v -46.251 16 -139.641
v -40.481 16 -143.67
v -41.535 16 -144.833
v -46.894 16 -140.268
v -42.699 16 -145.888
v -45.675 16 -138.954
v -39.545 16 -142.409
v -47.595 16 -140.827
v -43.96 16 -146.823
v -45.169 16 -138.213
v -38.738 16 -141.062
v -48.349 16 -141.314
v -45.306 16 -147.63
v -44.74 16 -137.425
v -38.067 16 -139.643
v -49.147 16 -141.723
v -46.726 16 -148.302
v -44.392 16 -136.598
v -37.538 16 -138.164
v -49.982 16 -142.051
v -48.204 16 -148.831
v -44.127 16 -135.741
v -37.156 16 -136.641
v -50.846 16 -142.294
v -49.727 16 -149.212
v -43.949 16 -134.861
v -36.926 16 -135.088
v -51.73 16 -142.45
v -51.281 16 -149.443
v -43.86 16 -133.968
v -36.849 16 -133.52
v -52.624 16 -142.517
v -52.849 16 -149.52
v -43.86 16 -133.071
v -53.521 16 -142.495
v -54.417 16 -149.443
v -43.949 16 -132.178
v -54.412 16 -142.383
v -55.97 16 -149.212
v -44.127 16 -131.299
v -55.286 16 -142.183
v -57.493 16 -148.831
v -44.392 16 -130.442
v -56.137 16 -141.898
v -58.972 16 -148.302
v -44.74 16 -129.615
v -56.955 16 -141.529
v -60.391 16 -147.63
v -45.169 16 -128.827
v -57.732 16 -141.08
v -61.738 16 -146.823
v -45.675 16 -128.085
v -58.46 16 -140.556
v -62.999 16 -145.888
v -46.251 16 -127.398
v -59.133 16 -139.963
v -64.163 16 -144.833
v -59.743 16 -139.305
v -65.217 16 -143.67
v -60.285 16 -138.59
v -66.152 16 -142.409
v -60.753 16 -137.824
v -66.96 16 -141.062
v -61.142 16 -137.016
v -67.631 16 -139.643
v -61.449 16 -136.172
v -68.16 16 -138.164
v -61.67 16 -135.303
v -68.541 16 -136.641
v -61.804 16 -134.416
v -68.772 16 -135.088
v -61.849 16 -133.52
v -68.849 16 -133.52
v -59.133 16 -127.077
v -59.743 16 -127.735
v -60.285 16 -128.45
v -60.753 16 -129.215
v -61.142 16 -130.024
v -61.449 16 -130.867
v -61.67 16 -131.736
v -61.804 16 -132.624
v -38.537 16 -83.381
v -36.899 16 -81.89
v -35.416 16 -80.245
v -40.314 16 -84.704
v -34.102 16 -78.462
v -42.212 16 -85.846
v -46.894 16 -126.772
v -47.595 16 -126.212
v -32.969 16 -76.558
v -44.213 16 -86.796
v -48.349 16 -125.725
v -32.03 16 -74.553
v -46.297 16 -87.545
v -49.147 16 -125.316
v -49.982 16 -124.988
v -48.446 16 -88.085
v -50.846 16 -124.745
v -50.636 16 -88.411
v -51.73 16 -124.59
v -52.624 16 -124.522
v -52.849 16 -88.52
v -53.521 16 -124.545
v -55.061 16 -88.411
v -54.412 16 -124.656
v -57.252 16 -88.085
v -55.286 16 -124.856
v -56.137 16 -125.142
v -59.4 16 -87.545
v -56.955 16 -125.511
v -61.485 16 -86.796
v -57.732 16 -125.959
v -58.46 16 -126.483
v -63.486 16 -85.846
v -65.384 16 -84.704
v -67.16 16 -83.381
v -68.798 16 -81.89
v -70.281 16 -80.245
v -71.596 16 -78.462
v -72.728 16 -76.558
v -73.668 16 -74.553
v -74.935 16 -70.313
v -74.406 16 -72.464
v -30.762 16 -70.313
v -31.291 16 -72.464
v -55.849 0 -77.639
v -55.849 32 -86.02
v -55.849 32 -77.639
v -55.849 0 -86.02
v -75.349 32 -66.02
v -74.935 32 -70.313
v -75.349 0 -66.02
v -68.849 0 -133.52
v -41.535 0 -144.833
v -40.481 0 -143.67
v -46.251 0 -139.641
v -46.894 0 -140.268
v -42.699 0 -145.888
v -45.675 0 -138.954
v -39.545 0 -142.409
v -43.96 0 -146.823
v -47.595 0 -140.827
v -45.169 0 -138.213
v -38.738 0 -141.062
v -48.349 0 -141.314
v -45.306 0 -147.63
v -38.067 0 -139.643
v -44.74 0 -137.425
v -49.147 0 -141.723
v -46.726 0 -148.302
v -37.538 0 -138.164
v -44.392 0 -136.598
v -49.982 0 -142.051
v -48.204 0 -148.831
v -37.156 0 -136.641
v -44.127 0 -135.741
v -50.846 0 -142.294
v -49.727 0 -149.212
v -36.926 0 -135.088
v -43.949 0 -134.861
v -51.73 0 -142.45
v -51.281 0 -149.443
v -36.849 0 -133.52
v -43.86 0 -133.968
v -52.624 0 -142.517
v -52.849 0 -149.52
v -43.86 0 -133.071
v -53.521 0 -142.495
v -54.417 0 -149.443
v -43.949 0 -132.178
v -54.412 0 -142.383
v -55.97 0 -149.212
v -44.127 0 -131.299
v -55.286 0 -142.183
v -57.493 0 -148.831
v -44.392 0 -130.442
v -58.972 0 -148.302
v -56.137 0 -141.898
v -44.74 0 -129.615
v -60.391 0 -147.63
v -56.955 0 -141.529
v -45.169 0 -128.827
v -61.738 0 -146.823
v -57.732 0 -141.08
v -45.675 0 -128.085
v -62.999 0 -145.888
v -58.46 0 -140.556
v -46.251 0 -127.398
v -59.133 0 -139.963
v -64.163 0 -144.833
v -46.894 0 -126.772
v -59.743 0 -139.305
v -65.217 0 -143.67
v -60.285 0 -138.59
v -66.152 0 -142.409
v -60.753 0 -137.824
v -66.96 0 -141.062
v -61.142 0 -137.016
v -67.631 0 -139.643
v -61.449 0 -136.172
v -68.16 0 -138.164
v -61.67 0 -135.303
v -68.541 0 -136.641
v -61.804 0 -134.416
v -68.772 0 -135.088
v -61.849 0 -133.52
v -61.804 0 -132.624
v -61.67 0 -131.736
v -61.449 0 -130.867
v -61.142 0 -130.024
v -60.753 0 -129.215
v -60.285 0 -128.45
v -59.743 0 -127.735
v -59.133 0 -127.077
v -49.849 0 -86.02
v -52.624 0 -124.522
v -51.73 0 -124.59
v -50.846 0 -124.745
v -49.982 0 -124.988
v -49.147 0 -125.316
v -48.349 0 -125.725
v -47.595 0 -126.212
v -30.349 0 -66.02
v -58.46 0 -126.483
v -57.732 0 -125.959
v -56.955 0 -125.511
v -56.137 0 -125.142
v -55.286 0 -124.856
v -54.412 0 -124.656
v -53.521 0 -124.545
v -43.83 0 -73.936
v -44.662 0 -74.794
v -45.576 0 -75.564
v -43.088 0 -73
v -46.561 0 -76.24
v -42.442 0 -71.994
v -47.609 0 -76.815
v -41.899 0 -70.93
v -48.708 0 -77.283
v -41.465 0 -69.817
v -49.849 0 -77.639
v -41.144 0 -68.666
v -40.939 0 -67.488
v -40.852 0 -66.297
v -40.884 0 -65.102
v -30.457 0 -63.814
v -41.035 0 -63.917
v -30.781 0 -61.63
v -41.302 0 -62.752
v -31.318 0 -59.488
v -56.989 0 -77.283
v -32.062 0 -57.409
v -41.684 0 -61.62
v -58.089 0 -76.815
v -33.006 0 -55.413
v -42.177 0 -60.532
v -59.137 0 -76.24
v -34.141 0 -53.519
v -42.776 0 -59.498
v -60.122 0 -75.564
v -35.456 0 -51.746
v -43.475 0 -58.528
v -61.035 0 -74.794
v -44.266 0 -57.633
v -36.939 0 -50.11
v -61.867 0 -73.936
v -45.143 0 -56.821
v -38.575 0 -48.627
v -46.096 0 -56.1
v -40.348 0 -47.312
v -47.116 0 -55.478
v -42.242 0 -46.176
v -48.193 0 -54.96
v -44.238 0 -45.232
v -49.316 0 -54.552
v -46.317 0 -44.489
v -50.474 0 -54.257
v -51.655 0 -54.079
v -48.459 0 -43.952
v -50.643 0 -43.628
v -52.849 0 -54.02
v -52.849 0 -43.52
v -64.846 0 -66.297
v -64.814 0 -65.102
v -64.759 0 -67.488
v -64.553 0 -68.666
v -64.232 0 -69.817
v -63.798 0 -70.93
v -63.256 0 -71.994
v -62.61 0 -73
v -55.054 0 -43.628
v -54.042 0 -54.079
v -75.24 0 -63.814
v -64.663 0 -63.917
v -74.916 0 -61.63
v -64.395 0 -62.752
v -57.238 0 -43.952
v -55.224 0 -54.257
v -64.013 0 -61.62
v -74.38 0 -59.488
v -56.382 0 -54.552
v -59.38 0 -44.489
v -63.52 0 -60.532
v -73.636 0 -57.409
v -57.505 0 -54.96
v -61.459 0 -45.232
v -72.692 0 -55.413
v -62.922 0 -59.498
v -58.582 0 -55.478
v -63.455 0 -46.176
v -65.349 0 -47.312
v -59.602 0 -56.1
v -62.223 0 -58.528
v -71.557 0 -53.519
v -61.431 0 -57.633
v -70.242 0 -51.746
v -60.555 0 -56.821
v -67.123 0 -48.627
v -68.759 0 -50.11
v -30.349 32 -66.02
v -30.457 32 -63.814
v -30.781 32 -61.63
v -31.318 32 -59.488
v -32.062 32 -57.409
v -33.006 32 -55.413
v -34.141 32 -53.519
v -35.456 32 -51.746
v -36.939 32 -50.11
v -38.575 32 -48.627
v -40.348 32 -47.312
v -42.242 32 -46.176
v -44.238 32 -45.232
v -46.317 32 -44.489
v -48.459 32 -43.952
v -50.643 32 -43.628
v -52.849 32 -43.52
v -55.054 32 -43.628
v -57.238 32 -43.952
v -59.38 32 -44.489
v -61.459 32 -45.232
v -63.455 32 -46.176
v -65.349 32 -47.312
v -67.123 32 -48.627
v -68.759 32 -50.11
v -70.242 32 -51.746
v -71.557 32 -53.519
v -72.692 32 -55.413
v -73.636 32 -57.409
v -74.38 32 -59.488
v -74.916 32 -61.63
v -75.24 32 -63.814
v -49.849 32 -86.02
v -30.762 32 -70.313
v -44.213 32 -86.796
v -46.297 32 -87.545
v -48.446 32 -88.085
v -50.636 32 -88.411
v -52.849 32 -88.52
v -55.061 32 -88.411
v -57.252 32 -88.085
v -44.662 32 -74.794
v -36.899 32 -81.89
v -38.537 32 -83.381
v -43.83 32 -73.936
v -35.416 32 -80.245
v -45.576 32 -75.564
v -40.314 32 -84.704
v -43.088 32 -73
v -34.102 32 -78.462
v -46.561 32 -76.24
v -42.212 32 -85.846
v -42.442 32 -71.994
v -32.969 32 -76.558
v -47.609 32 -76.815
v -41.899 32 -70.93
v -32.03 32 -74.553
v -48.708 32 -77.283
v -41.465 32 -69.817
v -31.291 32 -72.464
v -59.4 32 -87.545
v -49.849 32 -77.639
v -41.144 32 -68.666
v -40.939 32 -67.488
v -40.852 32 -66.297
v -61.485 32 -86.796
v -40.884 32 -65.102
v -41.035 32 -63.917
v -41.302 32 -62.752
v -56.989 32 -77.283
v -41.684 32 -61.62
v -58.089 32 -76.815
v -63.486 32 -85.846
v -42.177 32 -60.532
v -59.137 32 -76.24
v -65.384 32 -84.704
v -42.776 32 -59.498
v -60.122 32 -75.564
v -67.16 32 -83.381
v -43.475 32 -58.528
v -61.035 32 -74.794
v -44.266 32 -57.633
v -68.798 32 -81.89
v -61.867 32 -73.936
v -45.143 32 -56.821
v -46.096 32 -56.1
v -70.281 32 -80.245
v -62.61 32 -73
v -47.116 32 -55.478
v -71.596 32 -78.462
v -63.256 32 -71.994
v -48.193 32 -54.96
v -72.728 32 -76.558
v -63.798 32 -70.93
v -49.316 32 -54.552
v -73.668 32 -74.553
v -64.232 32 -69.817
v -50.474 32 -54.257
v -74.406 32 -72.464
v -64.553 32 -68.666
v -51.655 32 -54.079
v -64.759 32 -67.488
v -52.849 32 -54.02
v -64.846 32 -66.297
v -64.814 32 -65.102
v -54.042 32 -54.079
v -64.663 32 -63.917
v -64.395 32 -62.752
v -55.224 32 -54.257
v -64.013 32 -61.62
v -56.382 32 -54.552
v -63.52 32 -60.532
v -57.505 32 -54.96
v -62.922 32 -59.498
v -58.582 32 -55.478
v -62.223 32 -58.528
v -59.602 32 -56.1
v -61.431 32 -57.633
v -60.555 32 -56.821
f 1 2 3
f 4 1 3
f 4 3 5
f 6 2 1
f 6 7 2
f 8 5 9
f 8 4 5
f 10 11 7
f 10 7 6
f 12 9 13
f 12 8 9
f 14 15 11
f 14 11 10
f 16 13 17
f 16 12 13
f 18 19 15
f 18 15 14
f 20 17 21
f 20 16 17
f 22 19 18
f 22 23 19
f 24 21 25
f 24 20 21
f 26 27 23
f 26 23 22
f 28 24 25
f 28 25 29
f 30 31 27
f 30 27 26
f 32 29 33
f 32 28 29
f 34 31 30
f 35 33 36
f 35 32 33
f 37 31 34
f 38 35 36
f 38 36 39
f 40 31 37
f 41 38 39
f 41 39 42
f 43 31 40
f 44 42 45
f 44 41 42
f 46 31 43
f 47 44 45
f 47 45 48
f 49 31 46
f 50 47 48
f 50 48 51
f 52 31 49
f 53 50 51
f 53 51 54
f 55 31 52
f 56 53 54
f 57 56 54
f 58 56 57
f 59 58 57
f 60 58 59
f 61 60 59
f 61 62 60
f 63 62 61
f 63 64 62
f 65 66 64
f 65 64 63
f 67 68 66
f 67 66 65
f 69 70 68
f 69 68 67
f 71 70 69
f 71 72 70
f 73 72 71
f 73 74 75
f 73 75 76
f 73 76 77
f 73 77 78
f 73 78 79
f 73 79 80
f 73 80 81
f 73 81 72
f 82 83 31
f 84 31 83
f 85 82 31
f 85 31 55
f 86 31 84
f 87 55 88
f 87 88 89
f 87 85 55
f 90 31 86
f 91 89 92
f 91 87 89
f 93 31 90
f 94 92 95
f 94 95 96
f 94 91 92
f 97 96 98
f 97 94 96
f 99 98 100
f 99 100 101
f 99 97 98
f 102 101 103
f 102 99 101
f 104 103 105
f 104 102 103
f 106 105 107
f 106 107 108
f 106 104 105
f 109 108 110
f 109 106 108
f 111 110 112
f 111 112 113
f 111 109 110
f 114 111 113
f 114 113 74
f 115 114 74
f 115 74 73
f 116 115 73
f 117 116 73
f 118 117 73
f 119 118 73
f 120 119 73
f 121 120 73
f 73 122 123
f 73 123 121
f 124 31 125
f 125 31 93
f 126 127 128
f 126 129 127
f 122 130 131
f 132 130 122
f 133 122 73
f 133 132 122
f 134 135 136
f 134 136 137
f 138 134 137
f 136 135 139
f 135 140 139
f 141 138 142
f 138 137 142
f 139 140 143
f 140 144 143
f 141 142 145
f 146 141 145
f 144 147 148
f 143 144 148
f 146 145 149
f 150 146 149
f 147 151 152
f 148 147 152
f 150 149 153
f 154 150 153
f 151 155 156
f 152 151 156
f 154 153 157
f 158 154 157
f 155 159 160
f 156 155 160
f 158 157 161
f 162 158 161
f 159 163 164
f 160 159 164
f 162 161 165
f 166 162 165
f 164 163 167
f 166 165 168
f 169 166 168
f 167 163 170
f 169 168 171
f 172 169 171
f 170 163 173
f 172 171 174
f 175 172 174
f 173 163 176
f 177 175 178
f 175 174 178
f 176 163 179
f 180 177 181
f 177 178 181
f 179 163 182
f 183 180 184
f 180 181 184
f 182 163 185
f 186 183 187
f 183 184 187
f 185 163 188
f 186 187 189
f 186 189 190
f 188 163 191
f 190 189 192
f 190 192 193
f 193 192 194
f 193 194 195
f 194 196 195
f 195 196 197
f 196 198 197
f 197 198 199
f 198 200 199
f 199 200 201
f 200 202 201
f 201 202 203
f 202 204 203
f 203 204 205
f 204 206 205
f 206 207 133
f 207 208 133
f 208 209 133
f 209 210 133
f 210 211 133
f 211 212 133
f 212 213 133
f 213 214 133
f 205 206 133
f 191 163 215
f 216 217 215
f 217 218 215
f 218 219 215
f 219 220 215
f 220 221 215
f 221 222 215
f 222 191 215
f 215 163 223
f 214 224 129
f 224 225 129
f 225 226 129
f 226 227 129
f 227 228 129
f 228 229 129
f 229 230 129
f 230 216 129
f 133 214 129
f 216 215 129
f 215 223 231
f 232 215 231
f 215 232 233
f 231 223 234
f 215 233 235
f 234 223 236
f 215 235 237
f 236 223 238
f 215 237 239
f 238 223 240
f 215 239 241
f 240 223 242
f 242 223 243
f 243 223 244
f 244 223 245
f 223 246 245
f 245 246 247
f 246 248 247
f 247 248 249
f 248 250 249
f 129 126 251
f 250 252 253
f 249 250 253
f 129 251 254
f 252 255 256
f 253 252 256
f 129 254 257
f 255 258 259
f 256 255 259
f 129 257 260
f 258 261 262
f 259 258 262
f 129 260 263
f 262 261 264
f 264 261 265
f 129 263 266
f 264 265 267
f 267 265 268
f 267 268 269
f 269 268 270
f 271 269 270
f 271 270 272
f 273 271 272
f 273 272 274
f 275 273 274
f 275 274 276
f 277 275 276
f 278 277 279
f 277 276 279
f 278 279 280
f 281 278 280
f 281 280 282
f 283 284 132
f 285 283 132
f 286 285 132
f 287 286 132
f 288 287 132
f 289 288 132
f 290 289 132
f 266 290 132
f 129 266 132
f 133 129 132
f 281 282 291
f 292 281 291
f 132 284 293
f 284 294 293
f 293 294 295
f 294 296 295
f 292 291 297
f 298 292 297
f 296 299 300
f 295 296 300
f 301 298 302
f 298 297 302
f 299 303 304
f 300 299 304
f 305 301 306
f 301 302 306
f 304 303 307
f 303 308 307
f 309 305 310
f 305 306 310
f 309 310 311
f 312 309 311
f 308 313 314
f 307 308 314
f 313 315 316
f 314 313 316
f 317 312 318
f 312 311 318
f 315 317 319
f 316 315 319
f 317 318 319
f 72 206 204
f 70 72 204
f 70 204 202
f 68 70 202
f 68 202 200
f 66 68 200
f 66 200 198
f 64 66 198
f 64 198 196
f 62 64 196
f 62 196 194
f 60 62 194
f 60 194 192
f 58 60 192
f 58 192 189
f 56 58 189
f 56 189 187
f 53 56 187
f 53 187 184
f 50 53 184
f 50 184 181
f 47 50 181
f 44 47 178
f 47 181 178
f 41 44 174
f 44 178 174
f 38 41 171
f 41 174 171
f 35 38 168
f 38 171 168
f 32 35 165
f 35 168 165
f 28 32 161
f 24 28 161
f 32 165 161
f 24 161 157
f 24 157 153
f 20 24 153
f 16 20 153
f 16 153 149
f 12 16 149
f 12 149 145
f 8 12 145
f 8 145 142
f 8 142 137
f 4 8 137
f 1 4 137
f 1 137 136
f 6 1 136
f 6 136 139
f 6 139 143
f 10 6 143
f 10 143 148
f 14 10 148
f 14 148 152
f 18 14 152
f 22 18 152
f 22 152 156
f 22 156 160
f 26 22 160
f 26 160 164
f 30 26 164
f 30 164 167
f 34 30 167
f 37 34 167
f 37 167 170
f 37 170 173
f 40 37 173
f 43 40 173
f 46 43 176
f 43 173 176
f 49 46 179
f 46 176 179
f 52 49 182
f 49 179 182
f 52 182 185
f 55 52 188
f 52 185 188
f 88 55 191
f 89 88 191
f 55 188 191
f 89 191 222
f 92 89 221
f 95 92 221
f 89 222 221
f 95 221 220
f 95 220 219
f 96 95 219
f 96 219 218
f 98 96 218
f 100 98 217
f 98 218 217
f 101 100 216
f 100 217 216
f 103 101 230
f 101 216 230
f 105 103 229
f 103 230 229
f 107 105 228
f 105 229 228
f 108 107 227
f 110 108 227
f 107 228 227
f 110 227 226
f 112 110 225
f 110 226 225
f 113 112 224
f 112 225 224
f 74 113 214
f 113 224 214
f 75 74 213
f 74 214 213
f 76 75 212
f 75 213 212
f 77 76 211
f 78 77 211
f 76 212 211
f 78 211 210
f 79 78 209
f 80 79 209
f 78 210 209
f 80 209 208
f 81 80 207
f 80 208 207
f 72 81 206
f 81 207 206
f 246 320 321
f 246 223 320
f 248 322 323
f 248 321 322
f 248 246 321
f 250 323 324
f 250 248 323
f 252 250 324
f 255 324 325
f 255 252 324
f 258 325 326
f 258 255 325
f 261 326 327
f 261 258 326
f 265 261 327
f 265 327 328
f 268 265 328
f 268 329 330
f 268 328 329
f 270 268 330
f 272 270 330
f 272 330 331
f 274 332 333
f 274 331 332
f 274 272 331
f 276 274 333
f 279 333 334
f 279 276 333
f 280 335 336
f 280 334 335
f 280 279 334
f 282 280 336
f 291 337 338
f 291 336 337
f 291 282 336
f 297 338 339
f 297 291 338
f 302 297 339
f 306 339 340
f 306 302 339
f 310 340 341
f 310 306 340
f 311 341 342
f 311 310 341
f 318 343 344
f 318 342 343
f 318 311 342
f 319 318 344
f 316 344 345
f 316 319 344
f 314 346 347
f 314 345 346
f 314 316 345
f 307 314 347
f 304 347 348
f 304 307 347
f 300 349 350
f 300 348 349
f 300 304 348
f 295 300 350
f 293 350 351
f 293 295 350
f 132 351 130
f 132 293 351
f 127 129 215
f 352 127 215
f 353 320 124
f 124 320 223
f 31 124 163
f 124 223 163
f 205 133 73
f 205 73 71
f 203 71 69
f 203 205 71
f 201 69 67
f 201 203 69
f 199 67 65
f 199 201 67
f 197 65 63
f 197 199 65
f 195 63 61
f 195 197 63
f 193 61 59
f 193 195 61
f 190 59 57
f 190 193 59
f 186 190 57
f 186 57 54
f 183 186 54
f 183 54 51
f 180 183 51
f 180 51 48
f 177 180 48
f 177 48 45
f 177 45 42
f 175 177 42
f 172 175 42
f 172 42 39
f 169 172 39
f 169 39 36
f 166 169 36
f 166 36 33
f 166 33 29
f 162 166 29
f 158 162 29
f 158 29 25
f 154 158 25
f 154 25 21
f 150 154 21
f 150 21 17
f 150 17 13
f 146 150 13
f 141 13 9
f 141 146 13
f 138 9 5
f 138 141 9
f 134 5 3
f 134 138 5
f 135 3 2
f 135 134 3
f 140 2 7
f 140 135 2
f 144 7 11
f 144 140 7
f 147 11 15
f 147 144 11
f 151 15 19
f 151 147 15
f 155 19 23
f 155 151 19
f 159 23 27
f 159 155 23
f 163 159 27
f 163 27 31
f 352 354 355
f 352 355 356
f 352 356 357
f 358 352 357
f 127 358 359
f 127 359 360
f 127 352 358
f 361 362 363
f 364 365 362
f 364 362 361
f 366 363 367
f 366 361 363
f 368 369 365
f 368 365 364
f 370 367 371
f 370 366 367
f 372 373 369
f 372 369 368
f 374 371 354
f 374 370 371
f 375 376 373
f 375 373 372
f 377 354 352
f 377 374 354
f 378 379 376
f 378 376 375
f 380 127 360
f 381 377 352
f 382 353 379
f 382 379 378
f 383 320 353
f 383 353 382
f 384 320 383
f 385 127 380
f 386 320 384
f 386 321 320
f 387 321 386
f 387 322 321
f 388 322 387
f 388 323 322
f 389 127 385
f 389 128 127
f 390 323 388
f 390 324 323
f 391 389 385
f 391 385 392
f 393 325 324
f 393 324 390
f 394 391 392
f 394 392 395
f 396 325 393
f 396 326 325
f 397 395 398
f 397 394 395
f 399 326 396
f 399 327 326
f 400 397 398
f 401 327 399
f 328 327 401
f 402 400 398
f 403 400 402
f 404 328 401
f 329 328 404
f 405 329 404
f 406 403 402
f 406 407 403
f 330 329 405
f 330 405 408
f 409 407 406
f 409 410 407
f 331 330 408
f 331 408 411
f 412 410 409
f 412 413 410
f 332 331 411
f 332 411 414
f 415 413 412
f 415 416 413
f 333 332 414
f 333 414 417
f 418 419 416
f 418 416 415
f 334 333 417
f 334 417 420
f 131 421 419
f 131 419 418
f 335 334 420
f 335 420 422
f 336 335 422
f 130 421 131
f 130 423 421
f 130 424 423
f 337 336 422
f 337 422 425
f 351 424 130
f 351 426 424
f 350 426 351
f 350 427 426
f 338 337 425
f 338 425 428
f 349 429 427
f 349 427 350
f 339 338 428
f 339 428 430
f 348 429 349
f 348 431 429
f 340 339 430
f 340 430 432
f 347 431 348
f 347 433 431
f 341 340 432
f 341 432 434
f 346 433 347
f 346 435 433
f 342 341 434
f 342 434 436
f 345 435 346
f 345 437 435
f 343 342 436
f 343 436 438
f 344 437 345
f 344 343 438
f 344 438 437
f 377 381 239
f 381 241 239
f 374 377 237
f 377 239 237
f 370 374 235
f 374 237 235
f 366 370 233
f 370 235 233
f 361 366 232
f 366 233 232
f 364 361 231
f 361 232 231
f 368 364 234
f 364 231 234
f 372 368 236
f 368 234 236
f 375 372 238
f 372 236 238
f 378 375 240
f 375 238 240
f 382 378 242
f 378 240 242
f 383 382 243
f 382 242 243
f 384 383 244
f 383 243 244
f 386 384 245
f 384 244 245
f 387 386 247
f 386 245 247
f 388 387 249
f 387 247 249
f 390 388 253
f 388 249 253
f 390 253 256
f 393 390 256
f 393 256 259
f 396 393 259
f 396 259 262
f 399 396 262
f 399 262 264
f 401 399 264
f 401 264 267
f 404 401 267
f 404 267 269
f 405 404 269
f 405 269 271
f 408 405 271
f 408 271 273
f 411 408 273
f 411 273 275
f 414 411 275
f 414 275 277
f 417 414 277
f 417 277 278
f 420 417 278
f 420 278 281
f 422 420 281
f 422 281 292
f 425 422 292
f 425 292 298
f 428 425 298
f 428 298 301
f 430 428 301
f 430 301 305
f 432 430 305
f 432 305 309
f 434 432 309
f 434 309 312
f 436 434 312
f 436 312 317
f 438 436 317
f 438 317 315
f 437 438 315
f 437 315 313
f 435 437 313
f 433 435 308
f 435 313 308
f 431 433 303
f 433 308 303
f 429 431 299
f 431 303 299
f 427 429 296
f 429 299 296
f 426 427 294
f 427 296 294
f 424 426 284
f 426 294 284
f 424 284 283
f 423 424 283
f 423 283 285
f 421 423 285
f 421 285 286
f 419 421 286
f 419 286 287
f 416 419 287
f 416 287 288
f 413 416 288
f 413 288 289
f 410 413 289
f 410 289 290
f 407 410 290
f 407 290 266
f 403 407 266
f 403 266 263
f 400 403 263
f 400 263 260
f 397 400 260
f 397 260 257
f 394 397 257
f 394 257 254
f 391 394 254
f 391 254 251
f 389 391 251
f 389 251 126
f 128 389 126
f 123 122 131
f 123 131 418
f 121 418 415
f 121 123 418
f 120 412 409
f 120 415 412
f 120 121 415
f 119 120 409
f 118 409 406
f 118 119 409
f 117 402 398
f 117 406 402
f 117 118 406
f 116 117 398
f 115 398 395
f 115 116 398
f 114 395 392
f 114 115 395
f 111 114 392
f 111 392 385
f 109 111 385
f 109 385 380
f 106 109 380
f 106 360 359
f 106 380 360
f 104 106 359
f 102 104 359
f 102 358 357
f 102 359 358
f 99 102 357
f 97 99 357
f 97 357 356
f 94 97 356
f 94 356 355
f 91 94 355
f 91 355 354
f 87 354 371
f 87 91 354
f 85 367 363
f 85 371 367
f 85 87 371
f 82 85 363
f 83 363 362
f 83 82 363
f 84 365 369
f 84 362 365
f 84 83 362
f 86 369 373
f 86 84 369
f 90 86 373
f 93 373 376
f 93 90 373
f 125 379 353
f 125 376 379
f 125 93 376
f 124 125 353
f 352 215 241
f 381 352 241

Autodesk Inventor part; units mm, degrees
ref_plane "YZ Plane" through (0, 0, 0) normal (1, 0, 0) x (0, 1, 0)
ref_plane "XZ Plane" through (0, 0, 0) normal (0, 1, 0) x (-1, 0, 0)
ref_plane "XY Plane" through (0, 0, 0) normal (0, 0, 1) x (1, 0, 0)
sketch "Sketch1" plane through (0, 0, 0) normal (0, 1, 0) x (-1, 0, 0)
  circle A0 centre (52.8488, -66.0197) radius 22.5
  arc A1 (55.8488, -77.6386) -> (49.8488, -77.6386) centre (52.8488, -66.0197) ccw
  line L0 (52.8488, -88.5197) -> (52.8488, -133.5197)
  line L1 (52.8488, -88.5197) -> (97.8488, -88.5197) construction
  line L2 (52.8488, -133.5197) -> (52.8488, -149.5197)
  circle A2 centre (52.8488, -133.5197) radius 9
  line L3 (52.8488, -133.5197) -> (68.8488, -133.5197)
  line L4 (52.8488, -133.5197) -> (60.8488, -147.3761)
  line L5 (52.8488, -133.5197) -> (68.8488, -133.5197) construction
  line L6 (52.8488, -133.5197) -> (44.8488, -147.3761)
  line L7 (52.8488, -133.5197) -> (68.8488, -133.5197) construction
  line L8 (52.8488, -133.5197) -> (49.8488, -133.5197)
  arc A3 (36.8488, -133.5197) -> (68.8488, -133.5197) centre (52.8488, -133.5197) ccw
  line L9 (52.8488, -66.0197) -> (75.3488, -66.0197)
  line L10 (52.8488, -66.0197) -> (30.3488, -66.0197)
  line L11 (75.3488, -66.0197) -> (68.8488, -133.5197)
  line L12 (30.3488, -66.0197) -> (36.8488, -133.5197)
  line L13 (52.8488, -78.0197) -> (55.8488, -78.0197)
  line L14 (52.8488, -78.0197) -> (55.8488, -78.0197) construction
  line L15 (55.8488, -78.0197) -> (55.8488, -86.0197)
  line L16 (55.8488, -86.0197) -> (49.8488, -86.0197)
  line L17 (52.8488, -78.0197) -> (49.8488, -78.0197)
  line L18 (52.8488, -78.0197) -> (55.8488, -78.0197) construction
  line L19 (49.8488, -78.0197) -> (49.8488, -86.0197)
  line L20 (55.8488, -78.0197) -> (55.8488, -77.6386)
  line L21 (49.8488, -78.0197) -> (49.8488, -77.6386)
  point P0 (0, 0)
  point P1 (30.7622, -70.3132)
  point P2 (74.9353, -70.3132)
  dimension "d0" = 45
  dimension "d1" = 24
  dimension "d2" = 45
  dimension "d3" = 90
  dimension "d4" = 18
  dimension "d5" = 16
  dimension "d6" = 16
  dimension "d7" = 60
  dimension "d8" = 16
  dimension "d9" = 120
  dimension "d10" = 16
  dimension "d11" = 16
  dimension "d12" = 3
  dimension "d13" = 0
  dimension "d14" = 8
  dimension "d15" = 6
  dimension "d16" = 3
  dimension "d17" = 180
extrude "Extrusion1" add sketch "Sketch1" along normal blind 32 contours L9 A1 L10 A0 | L11 A0 L12 L10 A1 L21 L19 L16 L15 L20 L9
extrude "Extrusion2" add sketch "Sketch1" along normal blind 16 contours L11 L3 A2 L0 A0 | A0 L0 A2 L6 A3 L12 | A3 L4 A2 L3 | A3 L2 A2 L4 | L6 A2 L2 A3
properties part number "trial 3"
